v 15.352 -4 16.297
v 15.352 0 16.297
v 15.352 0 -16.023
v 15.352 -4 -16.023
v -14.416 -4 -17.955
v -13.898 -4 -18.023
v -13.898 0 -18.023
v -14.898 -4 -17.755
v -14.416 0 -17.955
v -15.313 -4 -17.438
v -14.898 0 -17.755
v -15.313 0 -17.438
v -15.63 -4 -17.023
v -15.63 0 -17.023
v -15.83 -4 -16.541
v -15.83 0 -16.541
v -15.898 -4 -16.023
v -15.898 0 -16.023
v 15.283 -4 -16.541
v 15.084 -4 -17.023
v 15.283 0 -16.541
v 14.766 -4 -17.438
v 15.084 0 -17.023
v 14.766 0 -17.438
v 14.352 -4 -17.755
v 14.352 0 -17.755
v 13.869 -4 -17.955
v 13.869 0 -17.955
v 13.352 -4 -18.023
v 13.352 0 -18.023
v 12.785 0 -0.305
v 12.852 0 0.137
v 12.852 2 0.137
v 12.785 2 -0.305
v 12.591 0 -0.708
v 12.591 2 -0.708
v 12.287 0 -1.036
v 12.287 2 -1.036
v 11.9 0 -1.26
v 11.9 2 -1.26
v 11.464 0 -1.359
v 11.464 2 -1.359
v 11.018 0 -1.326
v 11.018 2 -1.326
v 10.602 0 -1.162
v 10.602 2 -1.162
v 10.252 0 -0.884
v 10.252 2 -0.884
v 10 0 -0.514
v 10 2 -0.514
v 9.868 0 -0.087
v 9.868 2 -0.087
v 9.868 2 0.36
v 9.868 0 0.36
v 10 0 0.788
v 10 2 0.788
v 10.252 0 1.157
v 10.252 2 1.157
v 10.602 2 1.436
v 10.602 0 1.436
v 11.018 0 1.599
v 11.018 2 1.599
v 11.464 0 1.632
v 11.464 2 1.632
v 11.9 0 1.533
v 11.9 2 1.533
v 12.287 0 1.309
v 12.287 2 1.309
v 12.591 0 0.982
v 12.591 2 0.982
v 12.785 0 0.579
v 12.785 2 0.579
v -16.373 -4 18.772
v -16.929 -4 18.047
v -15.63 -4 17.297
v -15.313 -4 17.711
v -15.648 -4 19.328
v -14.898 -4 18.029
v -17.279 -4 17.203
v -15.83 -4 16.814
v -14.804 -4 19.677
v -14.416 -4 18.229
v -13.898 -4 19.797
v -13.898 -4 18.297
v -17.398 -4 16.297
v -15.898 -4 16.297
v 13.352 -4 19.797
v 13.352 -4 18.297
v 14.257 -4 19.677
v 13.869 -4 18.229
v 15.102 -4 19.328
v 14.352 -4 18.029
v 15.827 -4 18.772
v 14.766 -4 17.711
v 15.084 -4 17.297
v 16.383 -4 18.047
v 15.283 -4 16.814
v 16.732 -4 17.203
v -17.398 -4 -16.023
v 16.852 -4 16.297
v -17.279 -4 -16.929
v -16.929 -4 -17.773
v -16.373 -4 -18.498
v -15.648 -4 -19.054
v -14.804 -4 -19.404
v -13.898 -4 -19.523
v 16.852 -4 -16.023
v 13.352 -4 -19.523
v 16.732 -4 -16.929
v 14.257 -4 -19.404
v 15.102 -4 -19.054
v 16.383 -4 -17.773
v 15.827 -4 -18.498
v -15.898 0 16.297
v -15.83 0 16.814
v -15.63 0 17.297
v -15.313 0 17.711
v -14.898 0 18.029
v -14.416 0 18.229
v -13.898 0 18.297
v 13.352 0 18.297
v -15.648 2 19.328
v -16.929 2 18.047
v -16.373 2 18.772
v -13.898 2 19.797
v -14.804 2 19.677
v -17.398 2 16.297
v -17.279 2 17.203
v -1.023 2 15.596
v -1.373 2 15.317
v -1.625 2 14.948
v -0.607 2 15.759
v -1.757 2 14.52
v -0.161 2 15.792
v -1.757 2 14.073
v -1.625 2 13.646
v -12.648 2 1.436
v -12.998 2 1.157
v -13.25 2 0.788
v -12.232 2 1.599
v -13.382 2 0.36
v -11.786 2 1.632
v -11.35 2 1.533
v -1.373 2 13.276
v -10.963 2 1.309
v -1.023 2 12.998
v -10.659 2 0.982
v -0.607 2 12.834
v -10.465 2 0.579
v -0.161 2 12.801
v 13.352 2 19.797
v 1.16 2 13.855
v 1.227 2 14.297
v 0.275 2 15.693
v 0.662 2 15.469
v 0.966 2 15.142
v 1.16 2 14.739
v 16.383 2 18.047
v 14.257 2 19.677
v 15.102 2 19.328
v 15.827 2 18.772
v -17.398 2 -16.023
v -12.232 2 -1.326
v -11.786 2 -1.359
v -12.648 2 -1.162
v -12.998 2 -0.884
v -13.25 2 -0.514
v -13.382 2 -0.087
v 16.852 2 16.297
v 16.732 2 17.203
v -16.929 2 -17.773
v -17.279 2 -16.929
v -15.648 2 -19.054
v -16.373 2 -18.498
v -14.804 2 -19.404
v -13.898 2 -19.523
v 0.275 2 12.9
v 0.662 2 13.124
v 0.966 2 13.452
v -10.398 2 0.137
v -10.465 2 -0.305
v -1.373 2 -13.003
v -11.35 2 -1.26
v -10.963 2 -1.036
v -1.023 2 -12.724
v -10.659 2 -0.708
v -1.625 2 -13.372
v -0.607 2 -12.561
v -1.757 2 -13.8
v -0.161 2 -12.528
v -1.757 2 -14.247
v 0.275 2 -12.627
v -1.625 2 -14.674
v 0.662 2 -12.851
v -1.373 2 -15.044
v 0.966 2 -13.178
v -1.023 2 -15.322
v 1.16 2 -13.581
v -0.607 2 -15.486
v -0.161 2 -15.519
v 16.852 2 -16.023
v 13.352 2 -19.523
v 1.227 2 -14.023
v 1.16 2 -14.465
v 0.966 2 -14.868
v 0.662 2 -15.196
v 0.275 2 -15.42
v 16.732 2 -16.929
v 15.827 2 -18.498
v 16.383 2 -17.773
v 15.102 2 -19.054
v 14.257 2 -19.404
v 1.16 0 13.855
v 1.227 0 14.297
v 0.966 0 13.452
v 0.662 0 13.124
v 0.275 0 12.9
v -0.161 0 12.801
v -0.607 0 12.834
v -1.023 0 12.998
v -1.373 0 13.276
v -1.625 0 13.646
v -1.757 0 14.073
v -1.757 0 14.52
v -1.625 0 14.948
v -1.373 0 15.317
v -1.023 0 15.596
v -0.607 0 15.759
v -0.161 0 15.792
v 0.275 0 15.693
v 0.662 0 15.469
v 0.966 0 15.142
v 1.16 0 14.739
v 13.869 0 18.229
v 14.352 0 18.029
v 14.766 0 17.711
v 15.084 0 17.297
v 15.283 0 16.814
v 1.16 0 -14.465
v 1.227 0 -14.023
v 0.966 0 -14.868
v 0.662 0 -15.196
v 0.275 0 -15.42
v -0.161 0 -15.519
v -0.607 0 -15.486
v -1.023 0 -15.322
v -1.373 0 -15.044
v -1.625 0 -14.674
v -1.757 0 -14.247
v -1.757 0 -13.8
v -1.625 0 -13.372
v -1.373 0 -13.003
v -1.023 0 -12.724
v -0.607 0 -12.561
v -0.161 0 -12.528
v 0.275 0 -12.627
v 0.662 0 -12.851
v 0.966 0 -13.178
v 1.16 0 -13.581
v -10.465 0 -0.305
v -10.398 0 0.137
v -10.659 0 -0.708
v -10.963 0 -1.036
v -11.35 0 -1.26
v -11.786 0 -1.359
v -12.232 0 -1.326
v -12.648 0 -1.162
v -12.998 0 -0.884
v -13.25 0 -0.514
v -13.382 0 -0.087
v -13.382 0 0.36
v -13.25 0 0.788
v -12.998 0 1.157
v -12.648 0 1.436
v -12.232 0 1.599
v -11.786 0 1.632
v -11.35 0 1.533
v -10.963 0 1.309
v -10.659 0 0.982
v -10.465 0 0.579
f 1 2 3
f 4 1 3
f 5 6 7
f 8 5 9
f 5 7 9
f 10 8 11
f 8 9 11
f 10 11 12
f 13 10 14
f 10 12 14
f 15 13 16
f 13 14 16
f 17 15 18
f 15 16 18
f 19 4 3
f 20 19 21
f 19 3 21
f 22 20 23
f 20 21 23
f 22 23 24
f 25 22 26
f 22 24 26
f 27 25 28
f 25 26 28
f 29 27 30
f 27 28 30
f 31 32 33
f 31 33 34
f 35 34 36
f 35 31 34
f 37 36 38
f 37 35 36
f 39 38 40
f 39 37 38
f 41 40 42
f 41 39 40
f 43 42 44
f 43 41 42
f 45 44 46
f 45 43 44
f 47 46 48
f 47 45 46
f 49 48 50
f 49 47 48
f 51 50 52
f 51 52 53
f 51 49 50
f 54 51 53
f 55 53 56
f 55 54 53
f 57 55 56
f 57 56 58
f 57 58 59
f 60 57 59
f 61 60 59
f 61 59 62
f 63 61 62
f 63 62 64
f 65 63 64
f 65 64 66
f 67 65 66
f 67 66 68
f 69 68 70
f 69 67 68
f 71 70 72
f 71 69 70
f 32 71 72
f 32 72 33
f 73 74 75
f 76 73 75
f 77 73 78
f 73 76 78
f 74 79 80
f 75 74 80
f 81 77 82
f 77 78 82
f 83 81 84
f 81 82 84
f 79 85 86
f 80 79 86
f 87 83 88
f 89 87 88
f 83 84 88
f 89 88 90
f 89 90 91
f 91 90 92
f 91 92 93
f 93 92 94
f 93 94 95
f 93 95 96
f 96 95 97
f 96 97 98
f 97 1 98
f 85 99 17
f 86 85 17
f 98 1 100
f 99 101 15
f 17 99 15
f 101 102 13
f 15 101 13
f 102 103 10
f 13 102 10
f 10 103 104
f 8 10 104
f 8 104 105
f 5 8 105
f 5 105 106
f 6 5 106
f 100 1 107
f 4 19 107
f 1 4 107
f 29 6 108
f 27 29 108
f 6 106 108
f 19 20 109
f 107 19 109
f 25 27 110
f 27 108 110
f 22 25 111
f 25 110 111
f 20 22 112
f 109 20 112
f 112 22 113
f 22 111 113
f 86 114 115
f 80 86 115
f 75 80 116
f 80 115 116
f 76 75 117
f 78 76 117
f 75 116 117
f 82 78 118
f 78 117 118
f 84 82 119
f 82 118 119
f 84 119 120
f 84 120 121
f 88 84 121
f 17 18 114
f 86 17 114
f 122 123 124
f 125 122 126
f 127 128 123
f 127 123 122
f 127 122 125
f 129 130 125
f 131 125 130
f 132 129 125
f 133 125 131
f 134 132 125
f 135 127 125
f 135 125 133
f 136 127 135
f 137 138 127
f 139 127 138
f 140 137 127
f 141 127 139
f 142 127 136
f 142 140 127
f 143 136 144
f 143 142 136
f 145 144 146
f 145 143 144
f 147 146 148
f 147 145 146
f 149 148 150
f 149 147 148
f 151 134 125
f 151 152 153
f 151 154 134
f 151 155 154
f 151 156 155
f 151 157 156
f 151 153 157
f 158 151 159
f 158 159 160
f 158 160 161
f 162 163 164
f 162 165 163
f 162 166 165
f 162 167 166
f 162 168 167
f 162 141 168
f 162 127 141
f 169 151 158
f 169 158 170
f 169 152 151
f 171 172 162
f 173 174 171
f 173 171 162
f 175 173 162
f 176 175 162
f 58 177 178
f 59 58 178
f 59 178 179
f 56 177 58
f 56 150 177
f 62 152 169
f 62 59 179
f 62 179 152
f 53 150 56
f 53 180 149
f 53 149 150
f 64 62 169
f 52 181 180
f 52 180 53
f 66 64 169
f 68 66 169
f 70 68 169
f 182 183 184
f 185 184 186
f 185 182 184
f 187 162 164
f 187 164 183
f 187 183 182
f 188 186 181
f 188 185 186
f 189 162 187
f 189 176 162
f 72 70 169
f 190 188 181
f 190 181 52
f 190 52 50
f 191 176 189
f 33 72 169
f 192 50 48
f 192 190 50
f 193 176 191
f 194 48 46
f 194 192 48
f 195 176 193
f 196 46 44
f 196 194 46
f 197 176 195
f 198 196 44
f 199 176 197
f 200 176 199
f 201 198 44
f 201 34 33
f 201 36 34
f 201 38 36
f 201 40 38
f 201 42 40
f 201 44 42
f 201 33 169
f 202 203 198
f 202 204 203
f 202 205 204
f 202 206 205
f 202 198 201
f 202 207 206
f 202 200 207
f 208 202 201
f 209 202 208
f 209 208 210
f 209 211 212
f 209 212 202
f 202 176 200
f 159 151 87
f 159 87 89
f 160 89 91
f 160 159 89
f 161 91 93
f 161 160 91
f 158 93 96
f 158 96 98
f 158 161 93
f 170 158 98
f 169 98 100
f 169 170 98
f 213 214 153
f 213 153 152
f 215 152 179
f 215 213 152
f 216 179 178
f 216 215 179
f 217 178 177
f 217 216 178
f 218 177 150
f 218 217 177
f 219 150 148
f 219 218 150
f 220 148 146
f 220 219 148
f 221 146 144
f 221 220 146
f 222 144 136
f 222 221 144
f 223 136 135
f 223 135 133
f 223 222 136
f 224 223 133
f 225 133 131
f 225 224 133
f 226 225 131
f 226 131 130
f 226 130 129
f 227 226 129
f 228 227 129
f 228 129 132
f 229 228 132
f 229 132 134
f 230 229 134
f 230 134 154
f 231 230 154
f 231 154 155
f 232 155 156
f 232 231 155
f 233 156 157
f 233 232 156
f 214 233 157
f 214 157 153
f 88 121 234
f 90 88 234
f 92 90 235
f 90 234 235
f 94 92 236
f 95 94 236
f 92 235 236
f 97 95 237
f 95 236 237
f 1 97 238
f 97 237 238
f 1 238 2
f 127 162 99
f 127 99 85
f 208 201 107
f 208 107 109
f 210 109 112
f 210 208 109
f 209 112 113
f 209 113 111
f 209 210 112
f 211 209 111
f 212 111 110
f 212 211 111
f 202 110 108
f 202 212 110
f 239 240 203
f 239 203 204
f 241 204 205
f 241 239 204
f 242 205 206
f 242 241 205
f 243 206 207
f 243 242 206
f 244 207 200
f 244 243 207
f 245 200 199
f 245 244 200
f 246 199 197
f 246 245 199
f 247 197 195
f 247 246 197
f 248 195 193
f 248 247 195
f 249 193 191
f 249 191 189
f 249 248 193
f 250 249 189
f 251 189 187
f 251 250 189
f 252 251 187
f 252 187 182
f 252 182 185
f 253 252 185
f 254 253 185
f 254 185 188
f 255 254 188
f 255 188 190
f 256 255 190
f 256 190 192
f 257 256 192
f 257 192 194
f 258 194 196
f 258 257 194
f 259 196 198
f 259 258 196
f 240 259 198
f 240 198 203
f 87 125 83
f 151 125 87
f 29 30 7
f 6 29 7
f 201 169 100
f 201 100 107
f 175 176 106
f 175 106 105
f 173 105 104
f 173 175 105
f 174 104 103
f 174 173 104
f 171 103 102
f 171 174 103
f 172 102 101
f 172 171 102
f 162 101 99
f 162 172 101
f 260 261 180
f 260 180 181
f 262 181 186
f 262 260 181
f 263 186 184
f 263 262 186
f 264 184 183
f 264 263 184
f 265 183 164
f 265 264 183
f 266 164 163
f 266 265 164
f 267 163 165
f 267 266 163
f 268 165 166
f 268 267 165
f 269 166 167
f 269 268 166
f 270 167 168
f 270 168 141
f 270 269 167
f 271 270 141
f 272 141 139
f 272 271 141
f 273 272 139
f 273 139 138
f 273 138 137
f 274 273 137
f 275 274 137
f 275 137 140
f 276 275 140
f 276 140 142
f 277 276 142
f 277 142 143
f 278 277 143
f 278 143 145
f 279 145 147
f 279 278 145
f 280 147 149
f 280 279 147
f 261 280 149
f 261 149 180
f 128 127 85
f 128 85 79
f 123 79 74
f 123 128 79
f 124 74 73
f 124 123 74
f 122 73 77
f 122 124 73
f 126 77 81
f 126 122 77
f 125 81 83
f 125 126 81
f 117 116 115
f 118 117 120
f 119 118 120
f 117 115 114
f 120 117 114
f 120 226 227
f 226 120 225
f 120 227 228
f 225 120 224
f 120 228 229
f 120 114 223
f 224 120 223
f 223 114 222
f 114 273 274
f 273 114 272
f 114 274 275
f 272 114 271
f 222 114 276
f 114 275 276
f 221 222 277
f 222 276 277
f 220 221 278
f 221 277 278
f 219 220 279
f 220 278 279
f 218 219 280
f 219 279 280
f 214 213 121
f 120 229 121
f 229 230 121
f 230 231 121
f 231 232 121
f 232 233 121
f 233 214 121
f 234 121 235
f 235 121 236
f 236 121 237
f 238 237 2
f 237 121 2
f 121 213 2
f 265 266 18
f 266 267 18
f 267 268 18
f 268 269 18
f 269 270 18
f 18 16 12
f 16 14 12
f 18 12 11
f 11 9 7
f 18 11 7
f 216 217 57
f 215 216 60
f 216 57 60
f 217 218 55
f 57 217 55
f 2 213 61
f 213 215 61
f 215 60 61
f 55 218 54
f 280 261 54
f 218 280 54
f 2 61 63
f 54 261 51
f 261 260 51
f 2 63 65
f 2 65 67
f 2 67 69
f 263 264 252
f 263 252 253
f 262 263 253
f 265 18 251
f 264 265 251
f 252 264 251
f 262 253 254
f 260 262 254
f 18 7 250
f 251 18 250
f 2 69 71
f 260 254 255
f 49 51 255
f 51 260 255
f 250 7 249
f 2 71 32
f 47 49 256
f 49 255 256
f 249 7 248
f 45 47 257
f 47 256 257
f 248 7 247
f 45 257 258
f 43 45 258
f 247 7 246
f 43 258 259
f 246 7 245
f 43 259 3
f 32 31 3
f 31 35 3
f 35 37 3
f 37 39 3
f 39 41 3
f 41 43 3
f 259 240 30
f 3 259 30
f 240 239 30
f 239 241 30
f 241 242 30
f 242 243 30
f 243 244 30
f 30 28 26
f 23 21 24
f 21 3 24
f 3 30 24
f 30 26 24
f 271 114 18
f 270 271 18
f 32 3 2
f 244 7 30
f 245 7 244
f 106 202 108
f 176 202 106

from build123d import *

# Parameters (mm, degrees)
SKETCH1_W           = 31.25
SKETCH1_H           = 36.32
SKETCH1_R           = 1.5
BOSS_EXTRUDE2_DEPTH = 2
FILLET1_R           = 2
BOSS_EXTRUDE3_DEPTH = 6


with BuildPart() as part:
    # Sketch1 → Boss-Extrude2 (new body)
    with BuildSketch(Plane(origin=(0, 0, 0), x_dir=(1, 0, 0), z_dir=(0, 1, 0))):
        with Locations((-0.273367395, -0.136683698)):
            Rectangle(SKETCH1_W, SKETCH1_H)
        with Locations((-0.273367395, 14.023316302)):
            Circle(SKETCH1_R, mode=Mode.SUBTRACT)
        with Locations((-11.898367395, -0.136683698)):
            Circle(SKETCH1_R, mode=Mode.SUBTRACT)
        with Locations((-0.273367395, -14.296683698)):
            Circle(SKETCH1_R, mode=Mode.SUBTRACT)
        with Locations((11.351632605, -0.136683698)):
            Circle(SKETCH1_R, mode=Mode.SUBTRACT)
    extrude(amount=BOSS_EXTRUDE2_DEPTH)

    # Fillet1
    fillet1_edges = [part.edges().sort_by_distance(p)[0] for p in [
        (15.351632605, 1, 18.296683698),
        (-15.898367395, 1, 18.296683698),
        (-15.898367395, 1, -18.023316302),
        (15.351632605, 1, -18.023316302),
    ]]
    fillet(fillet1_edges, radius=FILLET1_R)

    # Sketch3 → Boss-Extrude3 (add)
    with BuildSketch(Plane(origin=(0, 2, 0), x_dir=(1, 0, 0), z_dir=(0, 1, 0))):
        with BuildLine():
            Line((13.351632605, 19.523316302), (-13.898367395, 19.523316302))
            ThreePointArc((-13.898367395, 19.523316302), (-16.373241129, 18.498190037), (-17.398367395, 16.023316302))
            Line((-17.398367395, 16.023316302), (-17.398367395, -16.296683698))
            ThreePointArc((-17.398367395, -16.296683698), (-16.373241129, -18.771557432), (-13.898367395, -19.796683698))
            Line((-13.898367395, -19.796683698), (13.351632605, -19.796683698))
            ThreePointArc((13.351632605, -19.796683698), (15.826506339, -18.771557432), (16.851632605, -16.296683698))
            Line((16.851632605, -16.296683698), (16.851632605, 16.023316302))
            ThreePointArc((16.851632605, 16.023316302), (15.826506339, 18.498190037), (13.351632605, 19.523316302))
        make_face()
        with BuildLine():
            Line((13.351632605, 18.023316302), (-13.898367395, 18.023316302))
            ThreePointArc((-13.898367395, 18.023316302), (-15.312580957, 17.437529865), (-15.898367395, 16.023316302))
            Line((-15.898367395, 16.023316302), (-15.898367395, -16.296683698))
            ThreePointArc((-15.898367395, -16.296683698), (-15.312580957, -17.71089726), (-13.898367395, -18.296683698))
            Line((-13.898367395, -18.296683698), (13.351632605, -18.296683698))
            ThreePointArc((13.351632605, -18.296683698), (14.765846167, -17.71089726), (15.351632605, -16.296683698))
            Line((15.351632605, -16.296683698), (15.351632605, 16.023316302))
            ThreePointArc((15.351632605, 16.023316302), (14.765846167, 17.437529865), (13.351632605, 18.023316302))
        make_face(mode=Mode.SUBTRACT)
    extrude(amount=-BOSS_EXTRUDE3_DEPTH)


solid = part.part
